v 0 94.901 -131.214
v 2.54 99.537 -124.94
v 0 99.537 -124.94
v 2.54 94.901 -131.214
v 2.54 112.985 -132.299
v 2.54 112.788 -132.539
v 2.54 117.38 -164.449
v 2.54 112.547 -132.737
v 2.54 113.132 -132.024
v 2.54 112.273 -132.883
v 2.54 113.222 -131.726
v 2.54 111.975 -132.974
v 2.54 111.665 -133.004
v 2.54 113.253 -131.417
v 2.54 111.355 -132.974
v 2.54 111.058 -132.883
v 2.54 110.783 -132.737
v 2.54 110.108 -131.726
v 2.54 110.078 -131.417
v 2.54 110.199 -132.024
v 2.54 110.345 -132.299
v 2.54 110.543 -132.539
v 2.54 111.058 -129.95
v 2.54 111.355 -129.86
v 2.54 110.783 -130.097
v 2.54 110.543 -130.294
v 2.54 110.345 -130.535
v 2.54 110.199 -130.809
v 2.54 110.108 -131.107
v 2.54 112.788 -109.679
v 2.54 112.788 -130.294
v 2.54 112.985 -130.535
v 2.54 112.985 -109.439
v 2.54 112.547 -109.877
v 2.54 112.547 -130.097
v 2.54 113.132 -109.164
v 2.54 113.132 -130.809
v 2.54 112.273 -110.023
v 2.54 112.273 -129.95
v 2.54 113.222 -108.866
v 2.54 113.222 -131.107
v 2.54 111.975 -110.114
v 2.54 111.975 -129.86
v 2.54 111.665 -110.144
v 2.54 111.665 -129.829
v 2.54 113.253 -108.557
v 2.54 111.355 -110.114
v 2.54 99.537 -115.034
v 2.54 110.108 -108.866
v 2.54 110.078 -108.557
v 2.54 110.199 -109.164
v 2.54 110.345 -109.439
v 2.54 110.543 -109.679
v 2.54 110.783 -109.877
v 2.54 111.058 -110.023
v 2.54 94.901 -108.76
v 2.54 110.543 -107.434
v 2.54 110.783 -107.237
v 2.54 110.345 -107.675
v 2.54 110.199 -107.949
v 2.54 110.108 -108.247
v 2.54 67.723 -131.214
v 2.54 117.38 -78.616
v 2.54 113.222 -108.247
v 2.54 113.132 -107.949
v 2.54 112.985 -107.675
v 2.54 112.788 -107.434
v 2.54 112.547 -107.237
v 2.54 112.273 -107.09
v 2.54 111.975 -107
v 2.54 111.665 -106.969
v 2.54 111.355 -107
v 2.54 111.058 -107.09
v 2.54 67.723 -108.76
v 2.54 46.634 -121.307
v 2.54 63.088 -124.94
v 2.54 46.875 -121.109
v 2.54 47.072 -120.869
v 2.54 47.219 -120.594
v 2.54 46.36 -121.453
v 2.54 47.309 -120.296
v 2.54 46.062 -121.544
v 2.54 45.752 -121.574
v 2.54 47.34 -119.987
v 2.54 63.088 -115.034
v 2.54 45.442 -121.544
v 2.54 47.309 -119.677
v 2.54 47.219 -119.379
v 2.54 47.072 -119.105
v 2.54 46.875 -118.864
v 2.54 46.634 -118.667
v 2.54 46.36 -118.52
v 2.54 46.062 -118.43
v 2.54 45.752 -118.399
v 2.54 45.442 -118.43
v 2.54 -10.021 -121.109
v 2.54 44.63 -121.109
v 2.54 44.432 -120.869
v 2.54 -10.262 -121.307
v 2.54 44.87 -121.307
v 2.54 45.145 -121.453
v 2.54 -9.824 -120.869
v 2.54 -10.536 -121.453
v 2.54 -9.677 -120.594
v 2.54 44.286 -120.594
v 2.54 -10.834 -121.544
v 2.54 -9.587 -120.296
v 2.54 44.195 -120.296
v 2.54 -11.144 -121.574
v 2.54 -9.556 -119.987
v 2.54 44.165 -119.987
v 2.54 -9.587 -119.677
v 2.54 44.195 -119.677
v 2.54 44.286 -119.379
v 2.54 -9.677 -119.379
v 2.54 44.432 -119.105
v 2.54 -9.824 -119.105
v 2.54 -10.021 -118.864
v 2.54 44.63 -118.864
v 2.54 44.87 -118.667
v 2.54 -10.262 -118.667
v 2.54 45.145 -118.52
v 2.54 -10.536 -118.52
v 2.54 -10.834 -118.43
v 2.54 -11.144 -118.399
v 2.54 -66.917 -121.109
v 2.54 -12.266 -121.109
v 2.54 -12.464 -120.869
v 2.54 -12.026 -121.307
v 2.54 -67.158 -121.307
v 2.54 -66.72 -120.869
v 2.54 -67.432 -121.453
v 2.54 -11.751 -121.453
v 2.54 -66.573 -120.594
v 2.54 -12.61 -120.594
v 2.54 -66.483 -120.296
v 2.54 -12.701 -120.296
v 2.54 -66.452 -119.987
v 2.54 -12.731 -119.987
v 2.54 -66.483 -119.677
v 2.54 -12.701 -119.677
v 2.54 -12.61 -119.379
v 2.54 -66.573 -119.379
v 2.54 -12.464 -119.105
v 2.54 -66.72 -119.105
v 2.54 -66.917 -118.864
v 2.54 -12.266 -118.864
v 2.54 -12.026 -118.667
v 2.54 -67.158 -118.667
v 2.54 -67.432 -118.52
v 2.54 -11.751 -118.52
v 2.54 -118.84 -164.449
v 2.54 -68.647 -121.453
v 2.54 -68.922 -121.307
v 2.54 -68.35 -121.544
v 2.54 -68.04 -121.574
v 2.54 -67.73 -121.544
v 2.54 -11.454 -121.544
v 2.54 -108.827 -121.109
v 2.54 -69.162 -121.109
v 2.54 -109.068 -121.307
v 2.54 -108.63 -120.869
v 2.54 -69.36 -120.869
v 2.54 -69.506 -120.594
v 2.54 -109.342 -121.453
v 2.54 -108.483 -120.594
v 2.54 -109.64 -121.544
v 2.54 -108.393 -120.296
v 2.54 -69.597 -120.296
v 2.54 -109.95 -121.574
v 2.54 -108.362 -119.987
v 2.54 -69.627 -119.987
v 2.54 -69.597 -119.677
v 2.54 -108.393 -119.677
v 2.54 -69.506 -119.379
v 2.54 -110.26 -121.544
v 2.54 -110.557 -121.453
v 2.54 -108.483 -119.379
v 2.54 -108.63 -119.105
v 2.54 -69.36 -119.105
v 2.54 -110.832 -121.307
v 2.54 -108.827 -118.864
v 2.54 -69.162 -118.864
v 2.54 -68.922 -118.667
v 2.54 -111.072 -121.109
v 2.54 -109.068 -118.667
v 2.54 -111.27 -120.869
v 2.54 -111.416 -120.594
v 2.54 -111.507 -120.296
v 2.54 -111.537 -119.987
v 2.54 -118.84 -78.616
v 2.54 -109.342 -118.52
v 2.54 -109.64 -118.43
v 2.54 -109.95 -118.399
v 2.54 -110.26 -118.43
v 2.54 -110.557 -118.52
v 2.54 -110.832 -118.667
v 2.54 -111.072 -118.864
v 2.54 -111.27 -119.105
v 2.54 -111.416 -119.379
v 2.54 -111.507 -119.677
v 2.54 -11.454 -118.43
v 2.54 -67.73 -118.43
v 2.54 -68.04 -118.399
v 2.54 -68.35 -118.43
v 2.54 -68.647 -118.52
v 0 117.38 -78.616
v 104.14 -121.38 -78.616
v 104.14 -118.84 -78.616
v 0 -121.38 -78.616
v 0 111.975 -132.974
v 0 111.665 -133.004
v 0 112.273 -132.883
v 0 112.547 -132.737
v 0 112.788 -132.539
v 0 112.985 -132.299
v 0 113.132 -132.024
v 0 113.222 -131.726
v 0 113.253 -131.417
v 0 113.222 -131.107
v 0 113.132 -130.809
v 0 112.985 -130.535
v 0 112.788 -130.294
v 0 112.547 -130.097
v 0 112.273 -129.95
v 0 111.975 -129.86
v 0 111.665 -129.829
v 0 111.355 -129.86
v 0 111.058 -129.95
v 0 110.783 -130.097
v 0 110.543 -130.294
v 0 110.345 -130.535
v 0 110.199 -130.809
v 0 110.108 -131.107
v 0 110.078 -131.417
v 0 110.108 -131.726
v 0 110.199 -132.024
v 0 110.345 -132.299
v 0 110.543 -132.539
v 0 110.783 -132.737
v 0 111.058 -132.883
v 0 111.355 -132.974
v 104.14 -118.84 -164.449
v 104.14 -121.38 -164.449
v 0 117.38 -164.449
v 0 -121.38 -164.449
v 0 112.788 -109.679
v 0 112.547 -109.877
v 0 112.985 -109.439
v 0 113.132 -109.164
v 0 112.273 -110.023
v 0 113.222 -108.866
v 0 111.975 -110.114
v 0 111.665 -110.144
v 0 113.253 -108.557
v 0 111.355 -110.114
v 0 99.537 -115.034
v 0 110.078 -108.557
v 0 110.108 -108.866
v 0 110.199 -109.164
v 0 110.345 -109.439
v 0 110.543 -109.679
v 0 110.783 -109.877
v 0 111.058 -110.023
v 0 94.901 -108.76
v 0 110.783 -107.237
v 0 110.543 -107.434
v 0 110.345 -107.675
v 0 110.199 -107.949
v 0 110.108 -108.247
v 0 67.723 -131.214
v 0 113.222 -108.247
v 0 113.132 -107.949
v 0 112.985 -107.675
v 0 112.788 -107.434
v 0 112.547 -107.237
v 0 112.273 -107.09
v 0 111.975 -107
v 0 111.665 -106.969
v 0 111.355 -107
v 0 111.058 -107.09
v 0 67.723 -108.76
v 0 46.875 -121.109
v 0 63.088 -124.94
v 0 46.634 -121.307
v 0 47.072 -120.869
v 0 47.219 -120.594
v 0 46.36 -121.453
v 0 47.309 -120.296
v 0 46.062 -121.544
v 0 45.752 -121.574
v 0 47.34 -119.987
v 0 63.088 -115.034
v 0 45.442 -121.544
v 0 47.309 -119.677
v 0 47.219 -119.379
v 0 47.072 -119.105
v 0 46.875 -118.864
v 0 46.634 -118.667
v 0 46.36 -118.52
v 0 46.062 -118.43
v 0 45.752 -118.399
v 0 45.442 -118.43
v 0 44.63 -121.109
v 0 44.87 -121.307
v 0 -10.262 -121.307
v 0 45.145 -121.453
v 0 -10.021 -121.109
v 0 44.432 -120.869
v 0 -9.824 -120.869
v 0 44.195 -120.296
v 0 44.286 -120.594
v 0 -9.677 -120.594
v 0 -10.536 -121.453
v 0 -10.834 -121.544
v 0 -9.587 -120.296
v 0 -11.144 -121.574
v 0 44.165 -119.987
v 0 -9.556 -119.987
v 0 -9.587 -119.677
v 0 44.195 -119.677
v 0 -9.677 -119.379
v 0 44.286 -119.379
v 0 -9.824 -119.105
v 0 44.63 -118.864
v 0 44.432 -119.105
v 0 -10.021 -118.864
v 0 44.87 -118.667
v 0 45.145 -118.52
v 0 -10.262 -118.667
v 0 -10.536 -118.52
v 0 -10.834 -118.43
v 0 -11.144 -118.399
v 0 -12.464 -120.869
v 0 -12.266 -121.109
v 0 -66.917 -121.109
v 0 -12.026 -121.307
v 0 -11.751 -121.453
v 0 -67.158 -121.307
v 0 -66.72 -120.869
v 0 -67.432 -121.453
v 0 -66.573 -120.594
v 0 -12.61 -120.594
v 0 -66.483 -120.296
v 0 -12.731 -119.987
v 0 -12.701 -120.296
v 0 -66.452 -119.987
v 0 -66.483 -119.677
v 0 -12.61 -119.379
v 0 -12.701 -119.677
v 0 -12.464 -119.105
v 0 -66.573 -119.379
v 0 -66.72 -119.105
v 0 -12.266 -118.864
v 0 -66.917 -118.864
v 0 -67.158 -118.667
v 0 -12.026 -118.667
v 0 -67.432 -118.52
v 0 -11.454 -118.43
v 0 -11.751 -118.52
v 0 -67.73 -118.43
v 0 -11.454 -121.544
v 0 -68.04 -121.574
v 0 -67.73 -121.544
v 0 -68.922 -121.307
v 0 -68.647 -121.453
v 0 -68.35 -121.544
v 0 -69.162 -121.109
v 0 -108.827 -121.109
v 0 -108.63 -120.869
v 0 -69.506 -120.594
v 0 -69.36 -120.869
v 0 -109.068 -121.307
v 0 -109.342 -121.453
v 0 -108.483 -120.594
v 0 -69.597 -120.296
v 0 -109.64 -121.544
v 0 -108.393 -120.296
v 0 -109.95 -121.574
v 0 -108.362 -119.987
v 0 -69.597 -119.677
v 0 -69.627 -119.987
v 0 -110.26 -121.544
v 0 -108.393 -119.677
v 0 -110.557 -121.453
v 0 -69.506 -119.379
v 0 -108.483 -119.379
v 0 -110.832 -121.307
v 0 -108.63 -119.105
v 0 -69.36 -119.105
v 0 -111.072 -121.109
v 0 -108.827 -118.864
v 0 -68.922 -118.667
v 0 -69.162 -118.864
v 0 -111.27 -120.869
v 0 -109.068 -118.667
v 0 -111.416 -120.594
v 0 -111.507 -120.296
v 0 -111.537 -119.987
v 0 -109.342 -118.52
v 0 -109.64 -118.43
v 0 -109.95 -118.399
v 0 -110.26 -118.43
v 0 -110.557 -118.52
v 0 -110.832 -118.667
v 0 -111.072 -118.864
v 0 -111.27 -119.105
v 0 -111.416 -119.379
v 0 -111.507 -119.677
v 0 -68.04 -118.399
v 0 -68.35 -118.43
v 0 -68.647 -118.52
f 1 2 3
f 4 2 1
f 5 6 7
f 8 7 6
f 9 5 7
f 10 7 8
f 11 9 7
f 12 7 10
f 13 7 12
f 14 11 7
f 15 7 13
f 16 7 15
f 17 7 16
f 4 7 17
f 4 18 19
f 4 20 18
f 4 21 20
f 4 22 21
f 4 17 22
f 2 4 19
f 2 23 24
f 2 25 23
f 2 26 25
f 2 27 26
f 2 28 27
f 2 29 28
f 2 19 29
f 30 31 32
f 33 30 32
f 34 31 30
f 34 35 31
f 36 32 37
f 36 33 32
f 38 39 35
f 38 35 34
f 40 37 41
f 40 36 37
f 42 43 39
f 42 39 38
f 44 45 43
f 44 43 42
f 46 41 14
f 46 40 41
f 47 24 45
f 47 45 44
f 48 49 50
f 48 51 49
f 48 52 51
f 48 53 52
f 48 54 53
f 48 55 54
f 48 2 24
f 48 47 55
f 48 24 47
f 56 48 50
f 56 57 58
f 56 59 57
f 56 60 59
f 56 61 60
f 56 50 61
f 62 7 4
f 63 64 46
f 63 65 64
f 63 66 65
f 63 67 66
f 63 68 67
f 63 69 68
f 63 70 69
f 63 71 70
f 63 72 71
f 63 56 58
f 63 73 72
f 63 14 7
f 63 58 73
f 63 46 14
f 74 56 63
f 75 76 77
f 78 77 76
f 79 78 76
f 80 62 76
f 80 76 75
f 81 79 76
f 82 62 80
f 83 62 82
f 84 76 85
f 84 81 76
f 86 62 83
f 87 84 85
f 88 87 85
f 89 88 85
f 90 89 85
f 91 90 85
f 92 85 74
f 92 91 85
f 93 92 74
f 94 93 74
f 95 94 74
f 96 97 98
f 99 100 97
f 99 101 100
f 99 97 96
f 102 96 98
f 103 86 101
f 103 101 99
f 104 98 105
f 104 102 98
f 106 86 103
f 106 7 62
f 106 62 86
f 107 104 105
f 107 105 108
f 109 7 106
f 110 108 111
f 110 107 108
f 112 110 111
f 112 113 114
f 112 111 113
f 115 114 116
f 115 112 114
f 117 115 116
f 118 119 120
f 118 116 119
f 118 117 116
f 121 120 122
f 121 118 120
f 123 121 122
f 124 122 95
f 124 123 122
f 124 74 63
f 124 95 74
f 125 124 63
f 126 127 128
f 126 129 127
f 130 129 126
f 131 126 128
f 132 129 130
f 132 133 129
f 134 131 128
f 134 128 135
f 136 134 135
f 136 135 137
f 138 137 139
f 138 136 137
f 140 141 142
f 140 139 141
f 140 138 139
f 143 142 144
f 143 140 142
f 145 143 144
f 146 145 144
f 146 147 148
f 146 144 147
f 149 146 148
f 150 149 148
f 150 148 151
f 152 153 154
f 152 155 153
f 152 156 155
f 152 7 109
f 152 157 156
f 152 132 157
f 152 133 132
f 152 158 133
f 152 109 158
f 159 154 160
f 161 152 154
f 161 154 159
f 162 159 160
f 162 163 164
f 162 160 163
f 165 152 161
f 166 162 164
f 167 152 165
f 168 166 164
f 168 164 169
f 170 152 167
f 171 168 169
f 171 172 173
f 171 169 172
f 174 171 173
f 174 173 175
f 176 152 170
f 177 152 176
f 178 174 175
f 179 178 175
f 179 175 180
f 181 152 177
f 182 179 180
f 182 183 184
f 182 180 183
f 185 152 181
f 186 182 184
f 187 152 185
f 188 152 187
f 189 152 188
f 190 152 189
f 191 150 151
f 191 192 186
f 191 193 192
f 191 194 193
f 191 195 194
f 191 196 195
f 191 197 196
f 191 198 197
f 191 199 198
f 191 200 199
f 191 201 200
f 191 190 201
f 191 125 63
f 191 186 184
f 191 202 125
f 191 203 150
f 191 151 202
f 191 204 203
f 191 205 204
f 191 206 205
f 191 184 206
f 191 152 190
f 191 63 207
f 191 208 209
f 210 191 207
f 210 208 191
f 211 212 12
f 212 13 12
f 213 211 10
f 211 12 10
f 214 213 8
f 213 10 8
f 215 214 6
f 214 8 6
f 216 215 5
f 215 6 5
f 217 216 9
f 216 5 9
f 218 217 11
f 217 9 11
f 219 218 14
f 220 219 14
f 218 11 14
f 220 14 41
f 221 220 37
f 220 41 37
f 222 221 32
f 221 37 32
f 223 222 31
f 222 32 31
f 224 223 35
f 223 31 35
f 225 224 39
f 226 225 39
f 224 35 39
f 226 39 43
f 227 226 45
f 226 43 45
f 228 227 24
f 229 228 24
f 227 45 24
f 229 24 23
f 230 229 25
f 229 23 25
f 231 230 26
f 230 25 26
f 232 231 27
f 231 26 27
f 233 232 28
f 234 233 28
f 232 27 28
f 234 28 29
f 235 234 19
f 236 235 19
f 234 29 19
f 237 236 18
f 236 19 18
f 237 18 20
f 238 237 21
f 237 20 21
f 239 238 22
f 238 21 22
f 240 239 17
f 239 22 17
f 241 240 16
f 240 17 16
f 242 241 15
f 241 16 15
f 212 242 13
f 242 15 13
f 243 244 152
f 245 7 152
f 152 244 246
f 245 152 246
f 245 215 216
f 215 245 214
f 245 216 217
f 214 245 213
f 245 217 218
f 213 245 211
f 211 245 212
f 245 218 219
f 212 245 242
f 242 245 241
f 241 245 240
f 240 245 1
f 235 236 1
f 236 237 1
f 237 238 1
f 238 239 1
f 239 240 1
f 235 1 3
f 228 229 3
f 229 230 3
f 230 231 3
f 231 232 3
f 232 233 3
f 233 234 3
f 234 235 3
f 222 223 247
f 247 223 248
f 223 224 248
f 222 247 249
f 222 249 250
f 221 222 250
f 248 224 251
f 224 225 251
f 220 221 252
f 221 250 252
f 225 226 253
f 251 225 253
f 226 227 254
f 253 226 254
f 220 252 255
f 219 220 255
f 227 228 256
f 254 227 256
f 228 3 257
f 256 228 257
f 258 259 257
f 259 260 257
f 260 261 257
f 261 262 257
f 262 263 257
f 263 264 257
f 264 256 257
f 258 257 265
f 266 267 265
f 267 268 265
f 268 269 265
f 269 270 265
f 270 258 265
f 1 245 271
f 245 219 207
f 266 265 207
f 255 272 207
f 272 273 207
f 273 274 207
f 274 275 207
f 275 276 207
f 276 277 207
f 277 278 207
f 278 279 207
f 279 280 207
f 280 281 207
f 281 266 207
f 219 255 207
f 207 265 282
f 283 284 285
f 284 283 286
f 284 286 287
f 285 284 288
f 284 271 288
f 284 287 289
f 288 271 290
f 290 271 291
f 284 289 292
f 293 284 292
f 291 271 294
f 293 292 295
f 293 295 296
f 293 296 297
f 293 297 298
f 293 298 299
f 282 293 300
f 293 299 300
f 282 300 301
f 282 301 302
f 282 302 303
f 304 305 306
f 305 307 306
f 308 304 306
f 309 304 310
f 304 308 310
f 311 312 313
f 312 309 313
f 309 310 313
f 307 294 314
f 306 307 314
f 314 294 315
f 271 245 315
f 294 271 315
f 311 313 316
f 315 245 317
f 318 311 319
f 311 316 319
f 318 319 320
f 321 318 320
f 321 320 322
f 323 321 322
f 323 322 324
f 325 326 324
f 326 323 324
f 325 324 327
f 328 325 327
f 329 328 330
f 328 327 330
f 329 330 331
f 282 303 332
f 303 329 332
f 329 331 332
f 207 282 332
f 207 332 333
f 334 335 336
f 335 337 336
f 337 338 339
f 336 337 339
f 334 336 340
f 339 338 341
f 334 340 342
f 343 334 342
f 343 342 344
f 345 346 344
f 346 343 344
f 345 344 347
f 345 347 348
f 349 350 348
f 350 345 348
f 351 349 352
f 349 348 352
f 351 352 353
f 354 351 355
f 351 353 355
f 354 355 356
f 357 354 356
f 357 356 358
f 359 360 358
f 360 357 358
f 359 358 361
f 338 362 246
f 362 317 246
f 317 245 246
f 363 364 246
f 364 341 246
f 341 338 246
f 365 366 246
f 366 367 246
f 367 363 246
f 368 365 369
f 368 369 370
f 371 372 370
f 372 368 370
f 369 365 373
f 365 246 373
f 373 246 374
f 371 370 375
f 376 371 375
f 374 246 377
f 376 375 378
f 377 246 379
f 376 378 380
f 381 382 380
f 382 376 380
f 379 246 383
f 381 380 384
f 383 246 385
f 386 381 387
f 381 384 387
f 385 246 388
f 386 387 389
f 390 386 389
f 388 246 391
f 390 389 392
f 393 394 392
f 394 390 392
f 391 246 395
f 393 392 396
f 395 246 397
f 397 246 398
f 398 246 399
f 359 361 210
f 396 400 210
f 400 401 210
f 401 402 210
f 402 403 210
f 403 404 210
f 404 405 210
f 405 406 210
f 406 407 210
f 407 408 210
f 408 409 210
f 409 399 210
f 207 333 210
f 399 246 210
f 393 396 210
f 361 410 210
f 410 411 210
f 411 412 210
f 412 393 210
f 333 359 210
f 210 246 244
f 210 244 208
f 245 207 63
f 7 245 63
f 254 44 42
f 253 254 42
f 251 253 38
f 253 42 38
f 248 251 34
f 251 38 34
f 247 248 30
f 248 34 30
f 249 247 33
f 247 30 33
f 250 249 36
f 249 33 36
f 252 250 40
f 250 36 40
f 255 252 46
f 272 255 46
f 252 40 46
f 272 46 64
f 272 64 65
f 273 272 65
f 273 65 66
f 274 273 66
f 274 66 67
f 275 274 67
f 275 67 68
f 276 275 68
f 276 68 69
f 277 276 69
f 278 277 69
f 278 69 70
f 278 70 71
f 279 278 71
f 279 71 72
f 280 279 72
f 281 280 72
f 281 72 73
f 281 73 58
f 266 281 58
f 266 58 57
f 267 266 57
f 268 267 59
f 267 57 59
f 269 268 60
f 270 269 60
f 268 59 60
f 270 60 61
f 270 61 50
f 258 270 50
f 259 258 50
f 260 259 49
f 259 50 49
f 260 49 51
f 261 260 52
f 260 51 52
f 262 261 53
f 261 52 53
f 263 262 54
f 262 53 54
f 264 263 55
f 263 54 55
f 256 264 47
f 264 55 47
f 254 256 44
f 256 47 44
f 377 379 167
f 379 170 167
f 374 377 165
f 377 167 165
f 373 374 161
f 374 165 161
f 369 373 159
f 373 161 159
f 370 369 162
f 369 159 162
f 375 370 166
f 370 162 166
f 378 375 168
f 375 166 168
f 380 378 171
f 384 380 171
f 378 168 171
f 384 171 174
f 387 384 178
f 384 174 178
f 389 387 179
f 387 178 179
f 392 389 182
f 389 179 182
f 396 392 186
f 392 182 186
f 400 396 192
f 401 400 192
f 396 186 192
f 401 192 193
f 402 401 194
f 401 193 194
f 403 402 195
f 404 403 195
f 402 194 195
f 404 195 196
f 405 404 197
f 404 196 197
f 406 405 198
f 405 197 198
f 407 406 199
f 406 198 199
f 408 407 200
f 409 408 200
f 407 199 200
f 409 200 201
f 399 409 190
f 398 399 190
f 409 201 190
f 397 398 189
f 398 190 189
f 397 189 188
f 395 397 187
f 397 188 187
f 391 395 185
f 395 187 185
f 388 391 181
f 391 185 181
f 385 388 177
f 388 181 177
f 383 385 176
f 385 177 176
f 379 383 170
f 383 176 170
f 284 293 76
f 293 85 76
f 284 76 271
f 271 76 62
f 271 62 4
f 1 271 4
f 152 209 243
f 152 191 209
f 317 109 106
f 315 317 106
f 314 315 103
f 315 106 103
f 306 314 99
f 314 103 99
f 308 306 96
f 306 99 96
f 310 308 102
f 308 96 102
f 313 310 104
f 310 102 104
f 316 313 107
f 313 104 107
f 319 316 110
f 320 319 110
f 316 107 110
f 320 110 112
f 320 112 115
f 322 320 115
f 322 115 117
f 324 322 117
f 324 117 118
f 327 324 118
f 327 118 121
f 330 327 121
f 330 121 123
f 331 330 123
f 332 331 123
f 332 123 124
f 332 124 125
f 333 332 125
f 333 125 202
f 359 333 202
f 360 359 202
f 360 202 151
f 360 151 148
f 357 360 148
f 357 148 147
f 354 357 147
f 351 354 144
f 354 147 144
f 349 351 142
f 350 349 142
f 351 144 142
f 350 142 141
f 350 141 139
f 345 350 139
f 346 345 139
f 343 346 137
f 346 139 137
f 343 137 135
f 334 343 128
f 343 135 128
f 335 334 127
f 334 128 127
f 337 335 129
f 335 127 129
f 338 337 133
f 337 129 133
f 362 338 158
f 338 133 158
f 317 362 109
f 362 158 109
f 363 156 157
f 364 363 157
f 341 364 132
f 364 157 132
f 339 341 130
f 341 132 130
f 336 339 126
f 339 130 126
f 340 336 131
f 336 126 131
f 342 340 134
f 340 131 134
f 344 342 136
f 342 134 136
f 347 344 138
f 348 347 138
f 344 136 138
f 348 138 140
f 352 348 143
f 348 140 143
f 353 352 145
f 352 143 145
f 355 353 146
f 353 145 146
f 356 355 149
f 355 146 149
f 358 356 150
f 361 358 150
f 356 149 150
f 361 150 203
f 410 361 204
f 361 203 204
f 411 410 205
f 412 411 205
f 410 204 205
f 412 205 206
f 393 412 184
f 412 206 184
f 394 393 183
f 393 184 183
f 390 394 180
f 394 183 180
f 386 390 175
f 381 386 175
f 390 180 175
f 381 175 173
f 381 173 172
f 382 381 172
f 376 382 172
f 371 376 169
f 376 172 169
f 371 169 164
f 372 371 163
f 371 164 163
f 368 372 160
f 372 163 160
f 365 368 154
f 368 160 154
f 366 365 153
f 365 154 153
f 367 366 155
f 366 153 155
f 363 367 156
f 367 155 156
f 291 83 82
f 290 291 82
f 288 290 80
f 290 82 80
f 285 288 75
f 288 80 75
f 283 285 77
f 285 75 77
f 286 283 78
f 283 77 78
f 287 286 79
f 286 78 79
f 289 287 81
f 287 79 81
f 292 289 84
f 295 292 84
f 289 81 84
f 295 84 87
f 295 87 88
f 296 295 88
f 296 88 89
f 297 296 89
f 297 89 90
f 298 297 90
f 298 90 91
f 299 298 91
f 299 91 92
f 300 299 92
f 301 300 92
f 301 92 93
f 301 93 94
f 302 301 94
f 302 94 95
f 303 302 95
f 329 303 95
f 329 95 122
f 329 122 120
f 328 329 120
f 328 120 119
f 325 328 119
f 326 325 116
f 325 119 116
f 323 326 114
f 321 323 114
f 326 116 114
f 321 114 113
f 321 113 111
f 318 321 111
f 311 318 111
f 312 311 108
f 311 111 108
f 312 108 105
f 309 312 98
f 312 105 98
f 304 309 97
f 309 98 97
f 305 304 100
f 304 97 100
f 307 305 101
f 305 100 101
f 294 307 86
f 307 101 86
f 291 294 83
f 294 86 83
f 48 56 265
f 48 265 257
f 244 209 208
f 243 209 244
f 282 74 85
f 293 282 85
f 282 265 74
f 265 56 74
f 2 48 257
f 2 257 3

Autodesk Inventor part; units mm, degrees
ref_plane "YZ Plane" through (0, 0, 0) normal (1, 0, 0) x (0, 1, 0)
ref_plane "XZ Plane" through (0, 0, 0) normal (0, 1, 0) x (-1, 0, 0)
ref_plane "XY Plane" through (0, 0, 0) normal (0, 0, 1) x (1, 0, 0)
sketch "Sketch1" plane through (0, 0, 0) normal (1, 0, 0) x (0, 1, 0)
  line L0 (114.8402, -25.6502) -> (-118.8398, -25.6502)
  line L1 (-118.8398, -25.6502) -> (-118.8398, -330.4502)
  line L2 (-118.8398, -330.4502) -> (114.8402, -330.4502)
  line L3 (114.8402, -330.4502) -> (114.8402, -25.6502)
  point P0 (0, 0)
  dimension "d0" = 233.68
  dimension "d1" = 304.8
extrude "Extrusion1" add sketch "Sketch1" along normal blind 2.54
sketch "Sketch2" plane through (2.54, 0, 0) normal (1, 0, 0) x (0, 0, -1)
  line L0 (25.6502, -118.8398) -> (330.4502, -118.8398) projected
  line L1 (25.6502, -118.8398) -> (327.6155, -118.8398)
  line L2 (327.6155, -118.8398) -> (327.6155, -121.3798)
  line L3 (327.6155, -121.3798) -> (25.6502, -121.3798)
  line L4 (25.6502, -121.3798) -> (25.6502, -118.8398)
  point P0 (0, 0)
  dimension "d4" = 2.54
extrude "Extrusion2" add sketch "Sketch2" along normal blind 101.6 and the other way blind 2.54
sketch "Sketch3" plane through (2.54, 0, 0) normal (1, 0, 0) x (0, 0, -1)
  line L0 (115.0337, 99.5367) -> (124.9397, 99.5367)
  line L1 (115.0337, 63.0877) -> (124.9397, 63.0877)
  line L2 (108.7599, 94.9012) -> (108.7599, 67.7232)
  line L3 (131.2135, 67.7232) -> (131.2135, 94.9012)
  line L4 (119.9867, 99.5367) -> (119.9867, 63.0877)
  line L5 (119.9867, 81.3122) -> (117.9124, 81.3122)
  line L6 (108.7599, 94.9012) -> (115.0337, 99.5367)
  line L7 (124.9397, 99.5367) -> (131.2135, 94.9012)
  line L8 (108.7599, 67.7232) -> (115.0337, 63.0877)
  line L9 (124.9397, 63.0877) -> (131.2135, 67.7232)
  line L10 (330.4502, 114.8402) -> (25.6502, 114.8402) projected
  circle A0 centre (108.5567, 111.6652) radius 1.5875
  circle A1 centre (131.4167, 111.6652) radius 1.5875
  circle A2 centre (119.9867, 45.7522) radius 1.5875
  circle A3 centre (119.9867, -11.1438) radius 1.5875
  circle A4 centre (119.9867, -68.0398) radius 1.5875
  circle A5 centre (119.9867, -109.9498) radius 1.5875
  point P0 (0, 0)
  point P1 (108.7599, 81.3122)
  point P2 (119.9867, 63.0877)
  point P3 (131.2135, 81.3122)
  dimension "d9" = 36.449
  dimension "d10" = 22.4536
  dimension "d11" = 11.2268
  dimension "d12" = 9.906
  dimension "d13" = 9.906
  dimension "d14" = 0
  dimension "d15" = 27.178
  dimension "d16" = 27.178
  dimension "d17" = 0
  dimension "d18" = 0
  dimension "d19" = 33.528
  dimension "d20" = 3.175
  dimension "d21" = 3.175
  dimension "d22" = 3.175
  dimension "d23" = 3.175
  dimension "d24" = 11.43
  dimension "d25" = 11.43
  dimension "d26" = 3.175
  dimension "d27" = 3.175
  dimension "d28" = 3.175
  dimension "d29" = 3.175
  dimension "d30" = 0
  dimension "d31" = 0
  dimension "d32" = 0
  dimension "d33" = 69.088
  dimension "d34" = 125.984
  dimension "d35" = 182.88
  dimension "d36" = 224.79
extrude "Extrusion3" cut sketch "Sketch3" against normal blind 101.6
sketch "Sketch4" plane through (0, 114.8402, -25.6502) normal (0, 1, 0) x (1, 0, 0)
  line L0 (0, 304.8) -> (0, 0) projected
  line L1 (0, 0) -> (2.54, 0) projected
  line L2 (2.54, 304.8) -> (2.54, 0) projected
  line L3 (0, 304.8) -> (2.54, 304.8) projected
  point P0 (0, -25.6502)
extrude "Extrusion4" add sketch "Sketch4" along normal blind 2.54
sketch "Sketch5" plane through (2.54, -118.8398, -25.6502) normal (0, 1, 0) x (1, 0, 0)
  line L0 (-2.54, 0) -> (0, 0) projected
  line L1 (-2.54, 0) -> (104.5715, 0)
  line L2 (104.5715, 0) -> (104.5715, 52.966)
  line L3 (104.5715, 52.966) -> (-2.54, 52.966)
  line L4 (-2.54, 52.966) -> (-2.54, 0)
  line L5 (101.6, 0) -> (101.6, 301.9653) projected
  line L6 (-2.54, 304.8) -> (101.6, 304.8)
  line L7 (101.6, 304.8) -> (101.6, 138.7986)
  line L8 (101.6, 138.7986) -> (-2.54, 138.7986)
  line L9 (-2.54, 138.7986) -> (-2.54, 304.8)
  point P0 (-2.54, -25.6502)
  point P1 (101.6, 52.966)
extrude "Extrusion5" cut sketch "Sketch5" along normal through all both and the other way through all contours L4 L3 L5 L1 L0 | L8 L9 L6 L7 L5
properties part number "metal Back for v3.1"
